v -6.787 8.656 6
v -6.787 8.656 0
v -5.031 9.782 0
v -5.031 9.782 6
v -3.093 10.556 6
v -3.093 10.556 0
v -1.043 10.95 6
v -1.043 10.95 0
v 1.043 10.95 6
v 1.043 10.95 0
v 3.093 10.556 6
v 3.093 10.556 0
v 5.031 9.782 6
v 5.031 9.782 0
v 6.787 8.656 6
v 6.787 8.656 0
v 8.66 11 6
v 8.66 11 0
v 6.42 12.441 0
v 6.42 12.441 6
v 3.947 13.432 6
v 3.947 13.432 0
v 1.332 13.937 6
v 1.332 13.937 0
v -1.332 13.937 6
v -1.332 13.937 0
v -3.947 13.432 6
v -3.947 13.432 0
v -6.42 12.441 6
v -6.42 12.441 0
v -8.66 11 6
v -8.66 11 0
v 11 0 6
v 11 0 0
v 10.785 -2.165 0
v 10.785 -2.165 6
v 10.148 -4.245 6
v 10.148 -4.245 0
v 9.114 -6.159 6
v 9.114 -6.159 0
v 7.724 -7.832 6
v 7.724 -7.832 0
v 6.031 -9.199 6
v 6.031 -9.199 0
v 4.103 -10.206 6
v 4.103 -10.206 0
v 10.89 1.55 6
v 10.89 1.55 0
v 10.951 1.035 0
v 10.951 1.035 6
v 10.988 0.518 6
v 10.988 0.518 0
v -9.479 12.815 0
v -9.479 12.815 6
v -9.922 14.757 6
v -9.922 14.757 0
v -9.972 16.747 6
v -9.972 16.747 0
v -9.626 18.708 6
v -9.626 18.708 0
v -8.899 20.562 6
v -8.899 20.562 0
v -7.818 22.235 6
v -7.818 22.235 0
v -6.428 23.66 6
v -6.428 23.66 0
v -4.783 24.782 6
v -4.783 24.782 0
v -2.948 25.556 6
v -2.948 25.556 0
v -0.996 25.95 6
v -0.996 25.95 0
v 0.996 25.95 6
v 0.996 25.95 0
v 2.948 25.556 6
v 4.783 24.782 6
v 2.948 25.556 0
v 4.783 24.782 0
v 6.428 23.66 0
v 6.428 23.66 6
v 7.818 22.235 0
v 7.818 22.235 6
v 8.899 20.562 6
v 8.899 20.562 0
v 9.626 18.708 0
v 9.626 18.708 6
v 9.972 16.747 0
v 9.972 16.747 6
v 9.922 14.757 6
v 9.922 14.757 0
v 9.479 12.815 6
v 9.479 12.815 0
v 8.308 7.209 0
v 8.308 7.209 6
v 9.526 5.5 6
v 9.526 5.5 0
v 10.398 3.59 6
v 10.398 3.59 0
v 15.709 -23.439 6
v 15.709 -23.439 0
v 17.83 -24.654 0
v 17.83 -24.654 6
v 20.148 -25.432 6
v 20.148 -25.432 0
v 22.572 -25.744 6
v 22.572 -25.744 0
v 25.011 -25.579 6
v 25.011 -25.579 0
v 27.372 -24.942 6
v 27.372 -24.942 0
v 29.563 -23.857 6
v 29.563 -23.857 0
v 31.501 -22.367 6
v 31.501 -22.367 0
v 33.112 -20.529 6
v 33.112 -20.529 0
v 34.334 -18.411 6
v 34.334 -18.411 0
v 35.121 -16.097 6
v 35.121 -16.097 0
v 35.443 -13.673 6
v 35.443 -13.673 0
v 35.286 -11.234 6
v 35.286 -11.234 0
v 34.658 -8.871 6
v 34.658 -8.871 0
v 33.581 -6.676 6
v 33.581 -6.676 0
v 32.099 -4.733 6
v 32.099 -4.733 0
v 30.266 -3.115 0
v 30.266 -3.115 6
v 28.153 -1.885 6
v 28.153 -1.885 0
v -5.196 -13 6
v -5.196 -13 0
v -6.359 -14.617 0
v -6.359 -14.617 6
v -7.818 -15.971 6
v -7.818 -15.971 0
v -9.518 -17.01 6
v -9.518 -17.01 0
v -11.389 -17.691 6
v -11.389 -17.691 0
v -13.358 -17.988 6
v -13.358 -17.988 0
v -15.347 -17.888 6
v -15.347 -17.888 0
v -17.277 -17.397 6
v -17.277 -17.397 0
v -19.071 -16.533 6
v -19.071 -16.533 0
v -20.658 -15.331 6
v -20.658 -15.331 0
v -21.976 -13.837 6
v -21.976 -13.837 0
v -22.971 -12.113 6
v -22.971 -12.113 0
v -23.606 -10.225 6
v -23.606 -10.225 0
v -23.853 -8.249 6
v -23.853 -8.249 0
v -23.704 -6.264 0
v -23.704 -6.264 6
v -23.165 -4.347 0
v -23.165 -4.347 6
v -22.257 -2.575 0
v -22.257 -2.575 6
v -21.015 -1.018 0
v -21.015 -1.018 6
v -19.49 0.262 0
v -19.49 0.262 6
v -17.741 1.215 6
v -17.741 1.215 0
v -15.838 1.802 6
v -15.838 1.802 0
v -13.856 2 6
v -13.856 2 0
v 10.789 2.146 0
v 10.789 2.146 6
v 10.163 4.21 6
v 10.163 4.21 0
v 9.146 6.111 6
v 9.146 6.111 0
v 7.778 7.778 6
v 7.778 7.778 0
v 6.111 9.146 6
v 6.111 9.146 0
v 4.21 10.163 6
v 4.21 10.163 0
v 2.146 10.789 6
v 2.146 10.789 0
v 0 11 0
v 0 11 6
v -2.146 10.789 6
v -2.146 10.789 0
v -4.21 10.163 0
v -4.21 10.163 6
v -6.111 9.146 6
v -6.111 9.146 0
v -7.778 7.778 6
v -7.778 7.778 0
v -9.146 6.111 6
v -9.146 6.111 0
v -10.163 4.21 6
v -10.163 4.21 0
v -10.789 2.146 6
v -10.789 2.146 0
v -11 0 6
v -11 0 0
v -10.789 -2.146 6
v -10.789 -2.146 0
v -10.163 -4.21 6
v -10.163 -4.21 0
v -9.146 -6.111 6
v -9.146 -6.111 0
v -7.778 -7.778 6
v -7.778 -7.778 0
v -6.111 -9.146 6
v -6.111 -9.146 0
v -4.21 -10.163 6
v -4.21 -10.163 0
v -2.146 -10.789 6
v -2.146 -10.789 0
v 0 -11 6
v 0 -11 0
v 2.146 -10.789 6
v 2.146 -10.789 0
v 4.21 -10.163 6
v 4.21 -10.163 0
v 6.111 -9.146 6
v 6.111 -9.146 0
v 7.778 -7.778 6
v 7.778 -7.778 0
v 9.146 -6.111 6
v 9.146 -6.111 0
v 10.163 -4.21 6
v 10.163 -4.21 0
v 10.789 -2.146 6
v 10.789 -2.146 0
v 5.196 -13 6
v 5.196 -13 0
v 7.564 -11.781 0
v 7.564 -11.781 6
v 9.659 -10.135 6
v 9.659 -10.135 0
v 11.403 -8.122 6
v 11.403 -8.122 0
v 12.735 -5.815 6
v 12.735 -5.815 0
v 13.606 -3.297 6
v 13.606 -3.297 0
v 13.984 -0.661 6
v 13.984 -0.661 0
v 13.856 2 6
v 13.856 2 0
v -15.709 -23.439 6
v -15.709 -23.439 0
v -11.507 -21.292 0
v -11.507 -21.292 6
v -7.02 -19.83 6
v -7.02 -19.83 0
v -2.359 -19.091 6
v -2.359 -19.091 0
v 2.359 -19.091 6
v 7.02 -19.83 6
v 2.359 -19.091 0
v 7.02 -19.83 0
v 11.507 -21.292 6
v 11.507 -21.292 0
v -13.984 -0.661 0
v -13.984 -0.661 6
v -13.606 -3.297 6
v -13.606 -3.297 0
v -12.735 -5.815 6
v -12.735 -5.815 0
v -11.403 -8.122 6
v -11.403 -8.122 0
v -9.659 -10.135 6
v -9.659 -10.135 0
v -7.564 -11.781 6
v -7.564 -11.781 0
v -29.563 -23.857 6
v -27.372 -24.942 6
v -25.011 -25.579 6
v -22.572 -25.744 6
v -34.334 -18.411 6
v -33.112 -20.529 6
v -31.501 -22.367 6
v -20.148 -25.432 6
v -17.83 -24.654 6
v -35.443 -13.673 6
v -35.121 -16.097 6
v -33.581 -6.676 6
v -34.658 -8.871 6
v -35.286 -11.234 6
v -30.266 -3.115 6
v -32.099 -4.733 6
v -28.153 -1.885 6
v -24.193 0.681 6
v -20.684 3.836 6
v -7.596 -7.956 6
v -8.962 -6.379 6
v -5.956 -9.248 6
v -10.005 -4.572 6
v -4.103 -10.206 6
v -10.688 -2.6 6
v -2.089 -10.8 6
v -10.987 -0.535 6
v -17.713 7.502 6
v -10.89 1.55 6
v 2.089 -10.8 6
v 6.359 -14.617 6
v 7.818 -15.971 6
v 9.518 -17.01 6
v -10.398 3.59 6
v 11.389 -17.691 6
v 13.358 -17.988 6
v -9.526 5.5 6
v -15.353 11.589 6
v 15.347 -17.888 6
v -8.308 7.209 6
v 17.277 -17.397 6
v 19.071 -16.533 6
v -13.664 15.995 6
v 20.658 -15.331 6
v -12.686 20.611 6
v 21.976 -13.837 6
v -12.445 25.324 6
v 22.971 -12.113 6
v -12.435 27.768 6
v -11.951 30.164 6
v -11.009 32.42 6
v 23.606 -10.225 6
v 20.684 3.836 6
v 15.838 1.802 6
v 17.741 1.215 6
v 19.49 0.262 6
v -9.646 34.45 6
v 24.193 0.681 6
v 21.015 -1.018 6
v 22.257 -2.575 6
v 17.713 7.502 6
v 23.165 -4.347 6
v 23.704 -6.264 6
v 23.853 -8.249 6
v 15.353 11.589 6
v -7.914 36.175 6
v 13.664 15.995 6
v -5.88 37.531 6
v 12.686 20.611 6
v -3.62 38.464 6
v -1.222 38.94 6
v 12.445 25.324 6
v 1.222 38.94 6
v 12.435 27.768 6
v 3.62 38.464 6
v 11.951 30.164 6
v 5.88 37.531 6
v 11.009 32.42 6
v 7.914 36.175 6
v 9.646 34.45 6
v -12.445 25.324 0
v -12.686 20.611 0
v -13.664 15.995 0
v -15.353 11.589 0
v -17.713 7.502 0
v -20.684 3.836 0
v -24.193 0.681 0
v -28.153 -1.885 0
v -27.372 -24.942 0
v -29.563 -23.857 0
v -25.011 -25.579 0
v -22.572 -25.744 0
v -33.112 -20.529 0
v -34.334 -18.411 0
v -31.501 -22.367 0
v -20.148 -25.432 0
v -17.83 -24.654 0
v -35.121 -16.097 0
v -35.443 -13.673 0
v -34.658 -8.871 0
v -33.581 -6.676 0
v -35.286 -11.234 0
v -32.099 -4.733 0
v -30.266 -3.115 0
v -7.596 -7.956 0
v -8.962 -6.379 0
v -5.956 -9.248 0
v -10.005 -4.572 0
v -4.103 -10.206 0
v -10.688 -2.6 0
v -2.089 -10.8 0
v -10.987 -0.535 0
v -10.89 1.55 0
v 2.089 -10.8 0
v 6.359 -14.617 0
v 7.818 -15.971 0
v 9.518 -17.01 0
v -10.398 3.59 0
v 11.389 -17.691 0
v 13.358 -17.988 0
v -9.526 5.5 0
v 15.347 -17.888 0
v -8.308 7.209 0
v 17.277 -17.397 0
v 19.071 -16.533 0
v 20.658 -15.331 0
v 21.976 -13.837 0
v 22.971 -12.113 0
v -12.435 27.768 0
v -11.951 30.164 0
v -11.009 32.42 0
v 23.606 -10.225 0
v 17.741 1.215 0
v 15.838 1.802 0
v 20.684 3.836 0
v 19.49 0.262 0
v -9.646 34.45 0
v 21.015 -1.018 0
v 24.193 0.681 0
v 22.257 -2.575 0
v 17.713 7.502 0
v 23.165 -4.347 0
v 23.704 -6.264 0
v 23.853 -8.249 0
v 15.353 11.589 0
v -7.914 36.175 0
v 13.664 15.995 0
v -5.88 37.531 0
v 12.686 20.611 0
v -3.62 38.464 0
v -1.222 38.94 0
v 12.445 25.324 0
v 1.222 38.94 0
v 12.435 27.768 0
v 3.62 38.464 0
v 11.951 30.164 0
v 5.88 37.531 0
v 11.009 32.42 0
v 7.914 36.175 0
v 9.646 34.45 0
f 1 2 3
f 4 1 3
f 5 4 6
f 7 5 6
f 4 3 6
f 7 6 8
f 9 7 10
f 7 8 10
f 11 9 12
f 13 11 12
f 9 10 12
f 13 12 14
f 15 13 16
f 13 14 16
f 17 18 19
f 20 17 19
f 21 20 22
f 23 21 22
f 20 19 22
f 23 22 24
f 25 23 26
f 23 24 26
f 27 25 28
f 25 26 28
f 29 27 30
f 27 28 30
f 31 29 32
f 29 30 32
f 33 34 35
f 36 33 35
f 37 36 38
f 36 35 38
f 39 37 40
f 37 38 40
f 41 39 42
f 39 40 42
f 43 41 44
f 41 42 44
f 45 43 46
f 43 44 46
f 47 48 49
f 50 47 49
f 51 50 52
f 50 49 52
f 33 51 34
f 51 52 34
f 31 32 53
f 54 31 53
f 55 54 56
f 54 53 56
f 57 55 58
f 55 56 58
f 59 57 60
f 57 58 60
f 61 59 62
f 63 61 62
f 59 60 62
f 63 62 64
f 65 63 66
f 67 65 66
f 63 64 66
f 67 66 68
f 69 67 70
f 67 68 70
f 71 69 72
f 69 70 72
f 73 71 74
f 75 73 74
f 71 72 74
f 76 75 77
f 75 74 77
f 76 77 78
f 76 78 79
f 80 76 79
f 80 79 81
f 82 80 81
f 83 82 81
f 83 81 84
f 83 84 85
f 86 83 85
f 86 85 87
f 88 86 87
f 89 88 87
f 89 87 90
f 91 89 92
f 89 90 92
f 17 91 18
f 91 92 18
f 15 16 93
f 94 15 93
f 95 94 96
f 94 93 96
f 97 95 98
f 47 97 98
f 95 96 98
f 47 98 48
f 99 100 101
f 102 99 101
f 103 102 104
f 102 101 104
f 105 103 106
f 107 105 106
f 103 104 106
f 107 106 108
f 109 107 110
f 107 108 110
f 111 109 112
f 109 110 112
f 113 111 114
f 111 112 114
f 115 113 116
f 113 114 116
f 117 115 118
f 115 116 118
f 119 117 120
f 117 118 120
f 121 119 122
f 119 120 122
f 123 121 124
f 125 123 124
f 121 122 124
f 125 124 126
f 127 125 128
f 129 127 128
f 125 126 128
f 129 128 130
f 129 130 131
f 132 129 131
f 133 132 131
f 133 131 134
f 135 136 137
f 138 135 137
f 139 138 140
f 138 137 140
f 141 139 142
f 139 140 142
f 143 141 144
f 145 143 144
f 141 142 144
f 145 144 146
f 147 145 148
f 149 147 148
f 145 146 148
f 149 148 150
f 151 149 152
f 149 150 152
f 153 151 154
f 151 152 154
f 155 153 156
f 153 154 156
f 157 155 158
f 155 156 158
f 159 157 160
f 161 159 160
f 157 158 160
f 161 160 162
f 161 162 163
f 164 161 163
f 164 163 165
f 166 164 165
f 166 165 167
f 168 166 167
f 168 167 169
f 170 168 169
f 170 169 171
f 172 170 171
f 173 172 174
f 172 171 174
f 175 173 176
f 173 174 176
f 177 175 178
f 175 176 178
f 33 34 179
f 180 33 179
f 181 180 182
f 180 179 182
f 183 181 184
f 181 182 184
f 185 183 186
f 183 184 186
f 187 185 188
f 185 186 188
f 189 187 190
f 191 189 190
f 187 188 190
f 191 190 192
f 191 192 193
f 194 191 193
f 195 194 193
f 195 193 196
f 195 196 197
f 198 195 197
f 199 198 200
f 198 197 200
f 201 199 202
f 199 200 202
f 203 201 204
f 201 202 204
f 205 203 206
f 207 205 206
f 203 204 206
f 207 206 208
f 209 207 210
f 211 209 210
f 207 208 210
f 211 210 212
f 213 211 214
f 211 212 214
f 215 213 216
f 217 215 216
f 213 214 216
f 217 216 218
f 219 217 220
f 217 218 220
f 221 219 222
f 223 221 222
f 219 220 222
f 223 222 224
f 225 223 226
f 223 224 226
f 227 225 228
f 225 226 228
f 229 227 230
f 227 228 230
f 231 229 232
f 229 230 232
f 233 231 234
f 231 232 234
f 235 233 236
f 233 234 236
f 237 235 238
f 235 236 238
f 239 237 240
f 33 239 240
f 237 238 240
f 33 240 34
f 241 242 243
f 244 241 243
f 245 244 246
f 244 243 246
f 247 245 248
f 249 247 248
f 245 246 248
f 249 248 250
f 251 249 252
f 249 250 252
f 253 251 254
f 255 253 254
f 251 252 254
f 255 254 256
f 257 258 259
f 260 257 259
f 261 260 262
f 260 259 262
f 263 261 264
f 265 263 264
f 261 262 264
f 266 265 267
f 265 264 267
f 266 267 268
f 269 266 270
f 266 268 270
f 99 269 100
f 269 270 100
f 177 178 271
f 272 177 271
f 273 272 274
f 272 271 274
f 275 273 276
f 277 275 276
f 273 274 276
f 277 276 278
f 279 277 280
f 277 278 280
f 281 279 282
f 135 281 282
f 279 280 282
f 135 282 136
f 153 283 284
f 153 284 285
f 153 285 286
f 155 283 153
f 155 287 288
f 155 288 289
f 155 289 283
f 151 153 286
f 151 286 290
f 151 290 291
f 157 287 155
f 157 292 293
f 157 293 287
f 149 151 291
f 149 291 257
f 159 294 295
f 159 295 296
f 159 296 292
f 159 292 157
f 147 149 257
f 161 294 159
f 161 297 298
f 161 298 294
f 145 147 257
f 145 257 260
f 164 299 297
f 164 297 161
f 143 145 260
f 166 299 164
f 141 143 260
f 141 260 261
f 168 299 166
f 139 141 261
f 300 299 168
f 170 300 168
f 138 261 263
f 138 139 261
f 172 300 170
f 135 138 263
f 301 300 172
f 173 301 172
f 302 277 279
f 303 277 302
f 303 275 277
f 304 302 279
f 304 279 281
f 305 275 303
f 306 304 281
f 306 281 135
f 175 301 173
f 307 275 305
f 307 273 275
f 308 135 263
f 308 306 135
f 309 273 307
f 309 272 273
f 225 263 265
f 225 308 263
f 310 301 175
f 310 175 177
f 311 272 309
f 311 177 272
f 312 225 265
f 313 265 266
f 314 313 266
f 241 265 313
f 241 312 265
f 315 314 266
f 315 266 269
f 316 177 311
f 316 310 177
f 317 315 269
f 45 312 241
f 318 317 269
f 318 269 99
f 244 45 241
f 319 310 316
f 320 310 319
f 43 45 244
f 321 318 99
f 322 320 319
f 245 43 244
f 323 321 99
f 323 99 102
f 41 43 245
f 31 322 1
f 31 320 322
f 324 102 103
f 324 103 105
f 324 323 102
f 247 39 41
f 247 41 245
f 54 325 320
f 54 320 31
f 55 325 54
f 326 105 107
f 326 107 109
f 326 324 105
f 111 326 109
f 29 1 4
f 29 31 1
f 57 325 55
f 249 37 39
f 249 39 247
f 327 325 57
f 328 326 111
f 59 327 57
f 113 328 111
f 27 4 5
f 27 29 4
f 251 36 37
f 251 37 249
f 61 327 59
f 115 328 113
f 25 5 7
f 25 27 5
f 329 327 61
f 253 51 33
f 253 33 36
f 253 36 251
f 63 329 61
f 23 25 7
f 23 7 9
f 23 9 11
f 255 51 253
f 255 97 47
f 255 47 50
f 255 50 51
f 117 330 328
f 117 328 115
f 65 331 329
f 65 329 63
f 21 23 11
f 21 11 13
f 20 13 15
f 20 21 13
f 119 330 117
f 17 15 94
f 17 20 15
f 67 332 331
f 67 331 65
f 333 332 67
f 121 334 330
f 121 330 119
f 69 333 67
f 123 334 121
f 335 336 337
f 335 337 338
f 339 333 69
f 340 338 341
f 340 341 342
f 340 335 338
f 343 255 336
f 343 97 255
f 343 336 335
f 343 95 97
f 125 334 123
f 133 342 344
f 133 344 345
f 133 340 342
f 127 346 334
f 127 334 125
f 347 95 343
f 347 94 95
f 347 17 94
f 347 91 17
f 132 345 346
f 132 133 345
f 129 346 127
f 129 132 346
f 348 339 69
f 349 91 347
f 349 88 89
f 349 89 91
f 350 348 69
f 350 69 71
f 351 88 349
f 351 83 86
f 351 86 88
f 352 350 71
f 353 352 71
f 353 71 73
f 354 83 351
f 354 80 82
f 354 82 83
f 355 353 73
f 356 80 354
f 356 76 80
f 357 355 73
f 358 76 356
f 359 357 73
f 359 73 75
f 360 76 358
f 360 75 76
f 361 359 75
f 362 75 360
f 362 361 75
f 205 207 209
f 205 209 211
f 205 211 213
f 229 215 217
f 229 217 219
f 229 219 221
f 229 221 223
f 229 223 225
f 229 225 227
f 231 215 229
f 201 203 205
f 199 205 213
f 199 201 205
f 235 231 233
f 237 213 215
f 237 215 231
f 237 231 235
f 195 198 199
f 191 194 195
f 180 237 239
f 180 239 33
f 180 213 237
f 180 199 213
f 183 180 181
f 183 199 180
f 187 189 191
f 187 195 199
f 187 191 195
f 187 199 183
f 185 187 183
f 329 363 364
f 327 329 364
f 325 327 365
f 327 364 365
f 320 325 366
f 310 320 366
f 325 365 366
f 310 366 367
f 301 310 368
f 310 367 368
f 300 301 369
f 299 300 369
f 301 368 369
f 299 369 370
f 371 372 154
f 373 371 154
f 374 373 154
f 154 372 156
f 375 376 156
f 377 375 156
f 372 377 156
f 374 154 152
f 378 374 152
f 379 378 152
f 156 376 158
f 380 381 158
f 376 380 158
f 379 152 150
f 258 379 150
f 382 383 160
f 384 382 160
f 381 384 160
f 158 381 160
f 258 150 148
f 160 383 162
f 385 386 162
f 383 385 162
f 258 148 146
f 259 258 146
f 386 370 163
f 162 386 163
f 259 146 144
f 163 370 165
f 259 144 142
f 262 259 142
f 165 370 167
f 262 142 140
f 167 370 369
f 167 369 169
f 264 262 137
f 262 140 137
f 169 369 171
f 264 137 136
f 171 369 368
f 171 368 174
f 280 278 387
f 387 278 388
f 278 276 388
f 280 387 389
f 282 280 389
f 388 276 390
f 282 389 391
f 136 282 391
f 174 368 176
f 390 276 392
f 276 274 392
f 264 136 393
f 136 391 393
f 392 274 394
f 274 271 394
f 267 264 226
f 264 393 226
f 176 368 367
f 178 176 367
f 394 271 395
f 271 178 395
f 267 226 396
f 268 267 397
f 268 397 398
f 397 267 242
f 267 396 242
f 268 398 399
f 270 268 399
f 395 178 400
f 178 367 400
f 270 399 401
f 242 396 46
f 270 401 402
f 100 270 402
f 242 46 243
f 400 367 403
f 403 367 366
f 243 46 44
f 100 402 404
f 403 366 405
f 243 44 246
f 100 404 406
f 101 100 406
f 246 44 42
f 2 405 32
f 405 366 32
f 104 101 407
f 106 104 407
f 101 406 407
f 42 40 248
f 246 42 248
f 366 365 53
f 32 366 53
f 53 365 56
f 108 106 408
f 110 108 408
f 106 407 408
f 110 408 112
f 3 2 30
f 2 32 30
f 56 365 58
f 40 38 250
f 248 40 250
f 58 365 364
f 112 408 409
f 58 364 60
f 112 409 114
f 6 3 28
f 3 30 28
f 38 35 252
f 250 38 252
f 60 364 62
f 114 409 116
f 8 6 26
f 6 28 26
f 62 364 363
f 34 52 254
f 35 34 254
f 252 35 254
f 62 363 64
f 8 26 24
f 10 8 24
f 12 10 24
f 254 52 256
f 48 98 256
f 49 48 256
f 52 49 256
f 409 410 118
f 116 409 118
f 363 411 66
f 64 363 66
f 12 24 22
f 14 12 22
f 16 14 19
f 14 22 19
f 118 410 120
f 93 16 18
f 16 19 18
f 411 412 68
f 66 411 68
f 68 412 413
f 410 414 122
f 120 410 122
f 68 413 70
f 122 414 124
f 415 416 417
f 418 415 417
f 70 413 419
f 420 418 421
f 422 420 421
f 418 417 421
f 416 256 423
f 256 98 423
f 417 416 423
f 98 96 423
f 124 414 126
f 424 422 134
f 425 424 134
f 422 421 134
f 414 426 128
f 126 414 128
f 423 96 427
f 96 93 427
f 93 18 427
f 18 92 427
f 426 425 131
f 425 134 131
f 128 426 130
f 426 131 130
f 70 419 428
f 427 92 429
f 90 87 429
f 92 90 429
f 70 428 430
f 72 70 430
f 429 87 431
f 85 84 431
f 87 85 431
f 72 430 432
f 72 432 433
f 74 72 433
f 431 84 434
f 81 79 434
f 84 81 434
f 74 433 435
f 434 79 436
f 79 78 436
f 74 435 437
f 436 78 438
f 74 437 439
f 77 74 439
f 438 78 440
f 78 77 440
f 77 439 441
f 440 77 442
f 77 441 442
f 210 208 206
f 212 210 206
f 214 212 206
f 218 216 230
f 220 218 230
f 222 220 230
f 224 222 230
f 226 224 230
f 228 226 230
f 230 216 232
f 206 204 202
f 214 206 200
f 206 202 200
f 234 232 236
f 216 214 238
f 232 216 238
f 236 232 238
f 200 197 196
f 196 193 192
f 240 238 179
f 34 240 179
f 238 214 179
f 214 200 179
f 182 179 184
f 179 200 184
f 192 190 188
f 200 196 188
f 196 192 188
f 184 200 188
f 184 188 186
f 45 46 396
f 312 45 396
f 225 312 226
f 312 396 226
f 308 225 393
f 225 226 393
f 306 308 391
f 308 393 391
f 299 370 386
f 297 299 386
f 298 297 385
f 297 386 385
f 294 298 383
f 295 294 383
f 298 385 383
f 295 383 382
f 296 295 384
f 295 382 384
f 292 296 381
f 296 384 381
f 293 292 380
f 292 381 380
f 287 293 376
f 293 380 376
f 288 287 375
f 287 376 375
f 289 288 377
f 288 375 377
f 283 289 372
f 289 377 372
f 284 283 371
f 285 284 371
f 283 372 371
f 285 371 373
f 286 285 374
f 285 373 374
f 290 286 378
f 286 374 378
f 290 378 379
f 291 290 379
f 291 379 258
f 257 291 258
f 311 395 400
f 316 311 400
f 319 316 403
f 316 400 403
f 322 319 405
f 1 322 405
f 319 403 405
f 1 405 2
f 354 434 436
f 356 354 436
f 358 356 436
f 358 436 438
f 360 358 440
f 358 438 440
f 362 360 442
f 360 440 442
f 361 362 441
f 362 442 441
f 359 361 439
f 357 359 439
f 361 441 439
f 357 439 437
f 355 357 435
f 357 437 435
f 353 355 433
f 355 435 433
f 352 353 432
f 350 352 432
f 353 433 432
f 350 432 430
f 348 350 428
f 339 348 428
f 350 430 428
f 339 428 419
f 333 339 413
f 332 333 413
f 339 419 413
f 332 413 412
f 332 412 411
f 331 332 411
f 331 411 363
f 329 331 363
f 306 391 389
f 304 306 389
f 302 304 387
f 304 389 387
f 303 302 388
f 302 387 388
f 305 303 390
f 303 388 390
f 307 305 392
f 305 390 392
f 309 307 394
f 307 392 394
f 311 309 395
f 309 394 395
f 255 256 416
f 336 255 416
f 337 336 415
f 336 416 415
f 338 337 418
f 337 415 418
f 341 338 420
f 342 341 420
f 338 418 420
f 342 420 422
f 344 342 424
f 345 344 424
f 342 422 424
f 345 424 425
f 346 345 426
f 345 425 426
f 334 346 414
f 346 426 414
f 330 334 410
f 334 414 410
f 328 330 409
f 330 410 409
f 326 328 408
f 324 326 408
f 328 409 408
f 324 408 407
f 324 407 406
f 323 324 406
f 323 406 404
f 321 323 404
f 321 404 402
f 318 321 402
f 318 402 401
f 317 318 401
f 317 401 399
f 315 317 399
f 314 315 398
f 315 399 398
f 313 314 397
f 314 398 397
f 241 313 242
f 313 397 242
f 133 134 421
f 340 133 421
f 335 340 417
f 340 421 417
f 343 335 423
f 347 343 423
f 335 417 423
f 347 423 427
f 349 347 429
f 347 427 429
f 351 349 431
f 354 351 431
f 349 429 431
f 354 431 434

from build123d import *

# Parameters (mm, degrees)
F1_DEPTH = 6
F2_R     = 11
F3_DEPTH = 6


with BuildPart() as f1:
    # F0 (on Top) → F1 (new body)
    with BuildSketch(Plane.XY):
        with BuildLine():
            ThreePointArc((28.153133, -1.884526), (16.452417, 9.498808), (12.444519, 25.323591))
            ThreePointArc((12.444519, 25.323591), (0, 39), (-12.444519, 25.323591))
            ThreePointArc((-12.444519, 25.323591), (-16.452417, 9.498808), (-28.153133, -1.884526))
            ThreePointArc((-28.153133, -1.884526), (-33.774991, -19.5), (-15.708613, -23.439065))
            ThreePointArc((-15.708613, -23.439065), (0, -18.997615), (15.708613, -23.439065))
            ThreePointArc((15.708613, -23.439065), (33.774991, -19.5), (28.153133, -1.884526))
        make_face()
        with BuildLine():
            ThreePointArc((-13.856406, 2), (-12.124356, -7), (-5.196152, -13))
            ThreePointArc((-5.196152, -13), (-22.51666, -13), (-13.856406, 2))
        make_face(mode=Mode.SUBTRACT)
        with BuildLine():
            ThreePointArc((5.196152, -13), (12.124356, -7), (13.856406, 2))
            ThreePointArc((13.856406, 2), (22.51666, -13), (5.196152, -13))
        make_face(mode=Mode.SUBTRACT)
        with BuildLine():
            ThreePointArc((-10.890252, 1.54997), (-9.526279, 5.5), (-6.78744, 8.65625))
            ThreePointArc((-6.78744, 8.65625), (0, 11), (6.78744, 8.65625))
            ThreePointArc((6.78744, 8.65625), (9.526279, 5.5), (10.890252, 1.54997))
            ThreePointArc((10.890252, 1.54997), (10.972529, 0.776925), (11, 0))
            ThreePointArc((11, 0), (9.114026, -6.159101), (4.102813, -10.20622))
            ThreePointArc((4.102813, -10.20622), (0, -11), (-4.102813, -10.20622))
            ThreePointArc((-4.102813, -10.20622), (-9.526279, -5.5), (-10.890252, 1.54997))
        make_face(mode=Mode.SUBTRACT)
        with BuildLine():
            ThreePointArc((-8.660254, 11), (0, 26), (8.660254, 11))
            ThreePointArc((8.660254, 11), (0, 14), (-8.660254, 11))
        make_face(mode=Mode.SUBTRACT)
    extrude(amount=F1_DEPTH)


with BuildPart() as f3:
    # F2 (on Top) → F3 (new body)
    with BuildSketch(Plane.XY):
        Circle(F2_R)
    extrude(amount=F3_DEPTH)


solid = Compound([f1.part, f3.part])
